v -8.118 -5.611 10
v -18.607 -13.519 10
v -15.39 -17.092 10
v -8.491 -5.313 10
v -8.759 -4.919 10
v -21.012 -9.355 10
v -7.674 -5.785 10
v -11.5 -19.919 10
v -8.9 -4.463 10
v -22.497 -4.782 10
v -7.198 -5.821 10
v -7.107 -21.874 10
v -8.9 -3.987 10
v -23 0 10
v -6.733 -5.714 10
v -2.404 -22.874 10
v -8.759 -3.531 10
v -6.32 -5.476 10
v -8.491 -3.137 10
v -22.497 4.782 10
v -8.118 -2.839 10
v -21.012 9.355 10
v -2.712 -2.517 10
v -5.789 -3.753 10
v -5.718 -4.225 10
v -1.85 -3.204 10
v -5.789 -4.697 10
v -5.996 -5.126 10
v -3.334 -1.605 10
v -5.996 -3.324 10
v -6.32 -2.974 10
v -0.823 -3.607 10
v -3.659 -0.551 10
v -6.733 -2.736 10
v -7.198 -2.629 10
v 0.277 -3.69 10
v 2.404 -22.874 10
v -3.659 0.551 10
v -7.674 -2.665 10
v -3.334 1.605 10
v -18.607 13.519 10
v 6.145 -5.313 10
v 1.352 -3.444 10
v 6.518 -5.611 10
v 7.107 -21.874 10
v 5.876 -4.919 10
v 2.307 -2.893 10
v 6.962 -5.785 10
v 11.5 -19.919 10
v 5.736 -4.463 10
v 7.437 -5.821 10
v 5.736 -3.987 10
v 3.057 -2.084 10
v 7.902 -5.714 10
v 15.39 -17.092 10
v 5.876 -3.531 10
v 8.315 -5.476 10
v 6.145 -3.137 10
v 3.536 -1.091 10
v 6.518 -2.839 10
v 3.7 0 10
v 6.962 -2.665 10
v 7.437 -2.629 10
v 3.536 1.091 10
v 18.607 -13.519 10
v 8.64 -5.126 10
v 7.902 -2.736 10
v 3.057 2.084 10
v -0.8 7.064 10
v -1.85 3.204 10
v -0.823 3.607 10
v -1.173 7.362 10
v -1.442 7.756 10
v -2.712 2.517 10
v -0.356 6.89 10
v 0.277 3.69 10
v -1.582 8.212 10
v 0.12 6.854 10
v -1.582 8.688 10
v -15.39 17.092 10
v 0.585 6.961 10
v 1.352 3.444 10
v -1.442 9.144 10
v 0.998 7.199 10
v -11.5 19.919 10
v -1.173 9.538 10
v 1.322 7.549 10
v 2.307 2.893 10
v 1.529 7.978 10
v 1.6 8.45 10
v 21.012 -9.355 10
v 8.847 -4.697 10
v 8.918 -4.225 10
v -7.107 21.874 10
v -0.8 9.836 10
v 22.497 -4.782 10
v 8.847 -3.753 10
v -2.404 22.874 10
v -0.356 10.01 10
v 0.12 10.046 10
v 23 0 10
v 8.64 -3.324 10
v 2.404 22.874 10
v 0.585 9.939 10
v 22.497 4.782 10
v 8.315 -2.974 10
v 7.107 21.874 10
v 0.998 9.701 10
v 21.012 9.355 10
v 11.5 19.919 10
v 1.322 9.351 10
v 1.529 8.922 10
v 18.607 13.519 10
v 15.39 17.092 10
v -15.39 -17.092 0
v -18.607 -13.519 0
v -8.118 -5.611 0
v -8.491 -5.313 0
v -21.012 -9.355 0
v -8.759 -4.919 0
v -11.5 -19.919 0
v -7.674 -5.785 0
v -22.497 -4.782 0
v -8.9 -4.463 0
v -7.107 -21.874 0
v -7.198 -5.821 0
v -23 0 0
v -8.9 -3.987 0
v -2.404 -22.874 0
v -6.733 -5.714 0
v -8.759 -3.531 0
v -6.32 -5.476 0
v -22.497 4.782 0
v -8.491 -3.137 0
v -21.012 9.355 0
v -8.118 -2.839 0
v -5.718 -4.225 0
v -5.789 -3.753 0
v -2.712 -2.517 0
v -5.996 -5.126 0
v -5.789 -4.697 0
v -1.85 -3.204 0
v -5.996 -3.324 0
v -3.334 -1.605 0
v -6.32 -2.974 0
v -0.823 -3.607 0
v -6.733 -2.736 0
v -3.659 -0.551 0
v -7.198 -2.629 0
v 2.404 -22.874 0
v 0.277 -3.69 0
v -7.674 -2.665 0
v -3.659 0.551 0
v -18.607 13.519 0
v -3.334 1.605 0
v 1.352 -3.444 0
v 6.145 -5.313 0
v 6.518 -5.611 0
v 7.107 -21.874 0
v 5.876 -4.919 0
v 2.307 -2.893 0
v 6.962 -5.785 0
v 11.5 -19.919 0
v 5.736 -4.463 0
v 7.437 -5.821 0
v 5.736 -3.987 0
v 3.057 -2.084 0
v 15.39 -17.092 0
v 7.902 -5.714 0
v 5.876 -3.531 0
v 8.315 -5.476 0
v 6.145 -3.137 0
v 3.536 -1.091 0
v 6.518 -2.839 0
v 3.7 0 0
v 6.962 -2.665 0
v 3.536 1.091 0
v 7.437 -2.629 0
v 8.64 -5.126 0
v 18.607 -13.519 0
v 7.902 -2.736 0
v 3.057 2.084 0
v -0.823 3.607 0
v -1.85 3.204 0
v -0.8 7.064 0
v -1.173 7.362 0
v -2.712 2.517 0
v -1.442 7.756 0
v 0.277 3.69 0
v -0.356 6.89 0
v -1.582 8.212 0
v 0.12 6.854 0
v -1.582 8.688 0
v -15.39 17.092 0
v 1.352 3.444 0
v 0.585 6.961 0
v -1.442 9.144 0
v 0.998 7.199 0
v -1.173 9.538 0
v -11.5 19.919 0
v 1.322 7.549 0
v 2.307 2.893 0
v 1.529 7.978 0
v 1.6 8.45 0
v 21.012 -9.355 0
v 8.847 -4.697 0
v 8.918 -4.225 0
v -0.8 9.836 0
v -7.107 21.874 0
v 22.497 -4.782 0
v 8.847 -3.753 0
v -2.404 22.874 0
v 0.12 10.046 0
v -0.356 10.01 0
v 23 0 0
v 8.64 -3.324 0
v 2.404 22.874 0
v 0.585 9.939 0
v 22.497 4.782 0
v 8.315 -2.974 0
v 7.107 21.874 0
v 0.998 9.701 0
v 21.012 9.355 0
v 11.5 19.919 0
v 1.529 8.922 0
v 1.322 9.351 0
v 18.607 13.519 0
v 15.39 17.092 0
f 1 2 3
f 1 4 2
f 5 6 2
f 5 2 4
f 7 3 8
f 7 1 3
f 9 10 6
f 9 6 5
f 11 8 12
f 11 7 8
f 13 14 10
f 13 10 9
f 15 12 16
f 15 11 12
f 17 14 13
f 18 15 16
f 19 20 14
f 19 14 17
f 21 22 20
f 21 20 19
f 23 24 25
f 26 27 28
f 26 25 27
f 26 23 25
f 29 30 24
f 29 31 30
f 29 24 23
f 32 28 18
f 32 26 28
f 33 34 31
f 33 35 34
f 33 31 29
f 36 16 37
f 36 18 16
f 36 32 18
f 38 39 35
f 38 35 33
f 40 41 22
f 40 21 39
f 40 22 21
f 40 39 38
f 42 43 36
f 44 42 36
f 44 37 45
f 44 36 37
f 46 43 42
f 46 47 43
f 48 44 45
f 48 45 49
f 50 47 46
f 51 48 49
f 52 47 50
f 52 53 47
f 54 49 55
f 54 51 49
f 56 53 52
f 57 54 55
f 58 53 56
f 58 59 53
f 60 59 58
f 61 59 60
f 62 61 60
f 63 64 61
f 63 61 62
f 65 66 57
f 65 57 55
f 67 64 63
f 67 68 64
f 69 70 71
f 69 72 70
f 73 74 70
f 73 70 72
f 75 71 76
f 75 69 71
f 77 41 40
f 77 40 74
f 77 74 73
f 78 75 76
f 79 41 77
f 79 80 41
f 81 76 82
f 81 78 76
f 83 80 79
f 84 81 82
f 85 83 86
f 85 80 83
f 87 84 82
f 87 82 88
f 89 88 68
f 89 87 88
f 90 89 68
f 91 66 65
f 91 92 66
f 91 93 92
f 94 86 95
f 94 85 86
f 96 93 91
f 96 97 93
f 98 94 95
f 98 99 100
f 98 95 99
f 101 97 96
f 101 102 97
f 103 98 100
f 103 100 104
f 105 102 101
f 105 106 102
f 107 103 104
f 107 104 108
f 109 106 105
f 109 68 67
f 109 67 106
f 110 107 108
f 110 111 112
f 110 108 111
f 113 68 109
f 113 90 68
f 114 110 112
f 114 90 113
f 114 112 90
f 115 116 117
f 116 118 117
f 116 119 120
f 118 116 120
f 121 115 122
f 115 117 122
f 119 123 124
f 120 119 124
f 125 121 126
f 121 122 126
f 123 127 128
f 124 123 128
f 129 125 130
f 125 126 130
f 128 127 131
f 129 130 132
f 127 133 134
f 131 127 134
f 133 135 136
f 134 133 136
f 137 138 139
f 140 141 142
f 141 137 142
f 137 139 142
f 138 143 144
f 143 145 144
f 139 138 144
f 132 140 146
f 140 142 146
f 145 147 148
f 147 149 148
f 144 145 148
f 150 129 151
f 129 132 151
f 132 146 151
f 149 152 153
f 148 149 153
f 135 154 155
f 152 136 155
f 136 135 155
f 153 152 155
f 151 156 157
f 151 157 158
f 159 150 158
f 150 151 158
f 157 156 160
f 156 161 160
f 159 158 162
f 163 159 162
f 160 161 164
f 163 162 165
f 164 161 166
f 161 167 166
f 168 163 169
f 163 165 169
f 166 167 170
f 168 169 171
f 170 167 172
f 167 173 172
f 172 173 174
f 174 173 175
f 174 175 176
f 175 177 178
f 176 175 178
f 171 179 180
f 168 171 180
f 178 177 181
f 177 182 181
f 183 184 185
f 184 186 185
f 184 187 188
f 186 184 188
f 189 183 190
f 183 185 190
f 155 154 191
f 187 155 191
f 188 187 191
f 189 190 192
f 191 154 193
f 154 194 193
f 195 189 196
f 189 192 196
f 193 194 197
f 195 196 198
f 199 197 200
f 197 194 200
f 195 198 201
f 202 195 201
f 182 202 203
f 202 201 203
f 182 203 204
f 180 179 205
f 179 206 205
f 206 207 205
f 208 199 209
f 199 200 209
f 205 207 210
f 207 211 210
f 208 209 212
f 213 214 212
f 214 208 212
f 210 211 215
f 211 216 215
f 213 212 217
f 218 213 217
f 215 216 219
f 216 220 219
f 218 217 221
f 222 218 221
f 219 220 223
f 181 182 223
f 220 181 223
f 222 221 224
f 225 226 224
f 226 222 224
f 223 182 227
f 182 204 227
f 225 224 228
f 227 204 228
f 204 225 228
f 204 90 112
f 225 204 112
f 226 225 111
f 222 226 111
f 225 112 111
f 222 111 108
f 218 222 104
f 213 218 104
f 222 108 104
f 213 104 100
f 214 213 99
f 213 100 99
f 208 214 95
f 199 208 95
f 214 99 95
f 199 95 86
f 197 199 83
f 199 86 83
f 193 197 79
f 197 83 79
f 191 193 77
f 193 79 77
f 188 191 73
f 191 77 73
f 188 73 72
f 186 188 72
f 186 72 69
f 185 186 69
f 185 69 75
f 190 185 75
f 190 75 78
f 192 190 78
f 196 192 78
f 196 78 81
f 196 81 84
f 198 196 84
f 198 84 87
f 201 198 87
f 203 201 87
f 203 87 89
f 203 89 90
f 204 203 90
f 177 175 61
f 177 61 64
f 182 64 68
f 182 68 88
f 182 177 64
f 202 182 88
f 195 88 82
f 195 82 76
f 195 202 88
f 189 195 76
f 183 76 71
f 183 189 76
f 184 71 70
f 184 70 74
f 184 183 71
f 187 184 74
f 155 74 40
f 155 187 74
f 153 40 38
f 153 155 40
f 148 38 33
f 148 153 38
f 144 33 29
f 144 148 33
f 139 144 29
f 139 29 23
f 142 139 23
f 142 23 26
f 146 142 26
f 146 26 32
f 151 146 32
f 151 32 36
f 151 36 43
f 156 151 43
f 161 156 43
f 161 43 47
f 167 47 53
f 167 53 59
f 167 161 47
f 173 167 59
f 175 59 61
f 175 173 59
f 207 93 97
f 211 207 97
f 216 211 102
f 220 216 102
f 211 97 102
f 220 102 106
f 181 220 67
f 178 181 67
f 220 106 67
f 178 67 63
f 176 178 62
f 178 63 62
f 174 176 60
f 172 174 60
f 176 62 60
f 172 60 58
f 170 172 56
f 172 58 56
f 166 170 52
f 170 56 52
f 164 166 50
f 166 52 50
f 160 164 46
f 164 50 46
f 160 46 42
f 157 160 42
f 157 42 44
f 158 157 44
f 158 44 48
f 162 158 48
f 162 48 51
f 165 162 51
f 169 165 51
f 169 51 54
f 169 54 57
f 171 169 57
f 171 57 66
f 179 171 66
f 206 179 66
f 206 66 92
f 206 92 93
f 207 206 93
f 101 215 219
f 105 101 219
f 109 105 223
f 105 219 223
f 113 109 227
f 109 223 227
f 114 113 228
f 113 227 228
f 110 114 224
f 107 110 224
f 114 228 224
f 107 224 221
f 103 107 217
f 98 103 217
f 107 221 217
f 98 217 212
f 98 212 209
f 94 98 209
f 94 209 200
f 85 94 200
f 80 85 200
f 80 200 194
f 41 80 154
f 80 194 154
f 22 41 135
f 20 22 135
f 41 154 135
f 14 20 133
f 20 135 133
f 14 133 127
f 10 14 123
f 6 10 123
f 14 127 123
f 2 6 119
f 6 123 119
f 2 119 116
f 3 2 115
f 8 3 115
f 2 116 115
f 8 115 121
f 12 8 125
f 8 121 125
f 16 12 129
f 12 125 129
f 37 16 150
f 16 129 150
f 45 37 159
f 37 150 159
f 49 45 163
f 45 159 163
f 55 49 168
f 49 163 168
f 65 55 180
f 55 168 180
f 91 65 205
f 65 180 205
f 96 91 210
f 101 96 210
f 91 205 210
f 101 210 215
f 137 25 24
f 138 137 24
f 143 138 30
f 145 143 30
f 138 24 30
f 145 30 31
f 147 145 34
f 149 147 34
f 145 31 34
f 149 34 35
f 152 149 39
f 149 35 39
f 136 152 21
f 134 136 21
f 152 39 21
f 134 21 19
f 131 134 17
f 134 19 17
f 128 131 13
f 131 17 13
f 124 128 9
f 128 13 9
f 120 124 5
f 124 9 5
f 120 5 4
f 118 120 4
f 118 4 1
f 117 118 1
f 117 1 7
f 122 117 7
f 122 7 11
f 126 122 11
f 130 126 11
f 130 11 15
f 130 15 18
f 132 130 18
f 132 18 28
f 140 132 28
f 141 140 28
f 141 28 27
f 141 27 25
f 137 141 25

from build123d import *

# Parameters (mm, degrees)
SKETCH1_R           = 23
SKETCH1_R_2         = 3.7
BOSS_EXTRUDE1_DEPTH = 10
HOLE1_D             = 3.2


with BuildPart() as part:
    # Sketch1 → Boss-Extrude1 (new body)
    with BuildSketch(Plane.XY):
        Circle(SKETCH1_R)
        Circle(SKETCH1_R_2, mode=Mode.SUBTRACT)
    extrude(amount=BOSS_EXTRUDE1_DEPTH)

    # Hole1 (through all)
    with Locations(Plane(origin=(0, 8.45, 0), x_dir=(-1, 0, 0), z_dir=(0, 0, -1))):
        with Locations((0, 0), (-7.317914662, -12.675), (7.317914662, -12.675)):
            Hole(HOLE1_D / 2)


solid = part.part
